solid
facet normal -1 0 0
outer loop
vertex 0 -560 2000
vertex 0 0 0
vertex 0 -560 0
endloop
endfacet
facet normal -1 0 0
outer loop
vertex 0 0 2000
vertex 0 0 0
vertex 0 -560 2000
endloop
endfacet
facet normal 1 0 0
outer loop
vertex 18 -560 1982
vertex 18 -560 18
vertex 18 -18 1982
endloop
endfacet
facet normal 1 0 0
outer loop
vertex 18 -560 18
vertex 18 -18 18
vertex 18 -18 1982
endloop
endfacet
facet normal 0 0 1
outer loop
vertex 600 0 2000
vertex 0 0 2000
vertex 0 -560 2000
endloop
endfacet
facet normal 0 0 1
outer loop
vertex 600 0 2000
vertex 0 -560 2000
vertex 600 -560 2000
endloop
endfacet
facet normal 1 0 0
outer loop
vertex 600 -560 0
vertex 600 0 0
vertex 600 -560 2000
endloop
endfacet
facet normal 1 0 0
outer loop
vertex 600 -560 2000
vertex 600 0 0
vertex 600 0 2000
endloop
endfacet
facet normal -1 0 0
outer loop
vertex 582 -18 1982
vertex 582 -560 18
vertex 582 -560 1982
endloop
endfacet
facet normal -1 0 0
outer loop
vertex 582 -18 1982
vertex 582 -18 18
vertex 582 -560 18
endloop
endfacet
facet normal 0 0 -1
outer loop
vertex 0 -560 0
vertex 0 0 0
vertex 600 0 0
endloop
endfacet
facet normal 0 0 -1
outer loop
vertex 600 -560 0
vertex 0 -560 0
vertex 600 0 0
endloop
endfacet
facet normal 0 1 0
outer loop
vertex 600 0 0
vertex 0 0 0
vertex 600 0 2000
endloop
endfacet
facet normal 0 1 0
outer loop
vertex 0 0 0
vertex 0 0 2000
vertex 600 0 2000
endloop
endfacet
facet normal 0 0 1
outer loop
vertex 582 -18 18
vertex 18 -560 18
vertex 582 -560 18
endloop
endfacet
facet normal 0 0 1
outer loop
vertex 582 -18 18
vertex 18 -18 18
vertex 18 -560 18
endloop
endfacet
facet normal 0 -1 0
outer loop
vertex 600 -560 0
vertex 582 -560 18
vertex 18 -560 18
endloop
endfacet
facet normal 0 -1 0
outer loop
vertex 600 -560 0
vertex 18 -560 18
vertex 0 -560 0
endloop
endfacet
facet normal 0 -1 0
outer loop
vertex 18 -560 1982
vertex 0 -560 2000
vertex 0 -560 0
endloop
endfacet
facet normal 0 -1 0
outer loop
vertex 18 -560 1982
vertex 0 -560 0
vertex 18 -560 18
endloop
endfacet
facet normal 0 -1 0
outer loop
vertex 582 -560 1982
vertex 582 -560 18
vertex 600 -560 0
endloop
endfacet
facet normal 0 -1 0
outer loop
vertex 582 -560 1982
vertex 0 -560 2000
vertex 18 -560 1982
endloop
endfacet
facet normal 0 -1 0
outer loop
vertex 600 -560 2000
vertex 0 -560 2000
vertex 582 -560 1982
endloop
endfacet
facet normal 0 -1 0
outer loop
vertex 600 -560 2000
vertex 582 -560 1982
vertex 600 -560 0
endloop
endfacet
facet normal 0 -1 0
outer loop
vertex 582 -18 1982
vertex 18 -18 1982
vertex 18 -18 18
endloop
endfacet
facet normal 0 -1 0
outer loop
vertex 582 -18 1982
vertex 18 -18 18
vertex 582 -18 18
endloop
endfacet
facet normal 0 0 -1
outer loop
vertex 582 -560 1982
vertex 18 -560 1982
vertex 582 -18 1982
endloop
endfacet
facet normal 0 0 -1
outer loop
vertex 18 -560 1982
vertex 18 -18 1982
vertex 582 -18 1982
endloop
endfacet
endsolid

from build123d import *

# Parameters (mm, degrees)
F0_W     = 41.6900217533
F0_H     = 40.332518518
F1_DEPTH = 560
F2_DEPTH = 600
F3_DEPTH = 2000
F4_T     = -18


with BuildPart() as f1:
    # F0 (on Front) → F1 (new body)
    with BuildSketch(Plane.XZ):
        with Locations((20.8450108767, 20.166259259)):
            Rectangle(F0_W, F0_H)
    extrude(amount=F1_DEPTH)

    # F2 (add): a face of the model
    f2_faces = [f1.faces().sort_by_distance(p)[0] for p in [
        (0, -280, 20.166259259),
    ]]
    extrude(f2_faces, amount=-F2_DEPTH)

    # F3 (add): a face of the model
    f3_faces = [f1.faces().sort_by_distance(p)[0] for p in [
        (300, -280, 0),
    ]]
    extrude(f3_faces, amount=-F3_DEPTH)

    # F4
    f4_openings = [f1.faces().sort_by_distance(p)[0] for p in [
        (300, -560, 1000),
    ]]
    offset(amount=F4_T, openings=f4_openings)


solid = f1.part
